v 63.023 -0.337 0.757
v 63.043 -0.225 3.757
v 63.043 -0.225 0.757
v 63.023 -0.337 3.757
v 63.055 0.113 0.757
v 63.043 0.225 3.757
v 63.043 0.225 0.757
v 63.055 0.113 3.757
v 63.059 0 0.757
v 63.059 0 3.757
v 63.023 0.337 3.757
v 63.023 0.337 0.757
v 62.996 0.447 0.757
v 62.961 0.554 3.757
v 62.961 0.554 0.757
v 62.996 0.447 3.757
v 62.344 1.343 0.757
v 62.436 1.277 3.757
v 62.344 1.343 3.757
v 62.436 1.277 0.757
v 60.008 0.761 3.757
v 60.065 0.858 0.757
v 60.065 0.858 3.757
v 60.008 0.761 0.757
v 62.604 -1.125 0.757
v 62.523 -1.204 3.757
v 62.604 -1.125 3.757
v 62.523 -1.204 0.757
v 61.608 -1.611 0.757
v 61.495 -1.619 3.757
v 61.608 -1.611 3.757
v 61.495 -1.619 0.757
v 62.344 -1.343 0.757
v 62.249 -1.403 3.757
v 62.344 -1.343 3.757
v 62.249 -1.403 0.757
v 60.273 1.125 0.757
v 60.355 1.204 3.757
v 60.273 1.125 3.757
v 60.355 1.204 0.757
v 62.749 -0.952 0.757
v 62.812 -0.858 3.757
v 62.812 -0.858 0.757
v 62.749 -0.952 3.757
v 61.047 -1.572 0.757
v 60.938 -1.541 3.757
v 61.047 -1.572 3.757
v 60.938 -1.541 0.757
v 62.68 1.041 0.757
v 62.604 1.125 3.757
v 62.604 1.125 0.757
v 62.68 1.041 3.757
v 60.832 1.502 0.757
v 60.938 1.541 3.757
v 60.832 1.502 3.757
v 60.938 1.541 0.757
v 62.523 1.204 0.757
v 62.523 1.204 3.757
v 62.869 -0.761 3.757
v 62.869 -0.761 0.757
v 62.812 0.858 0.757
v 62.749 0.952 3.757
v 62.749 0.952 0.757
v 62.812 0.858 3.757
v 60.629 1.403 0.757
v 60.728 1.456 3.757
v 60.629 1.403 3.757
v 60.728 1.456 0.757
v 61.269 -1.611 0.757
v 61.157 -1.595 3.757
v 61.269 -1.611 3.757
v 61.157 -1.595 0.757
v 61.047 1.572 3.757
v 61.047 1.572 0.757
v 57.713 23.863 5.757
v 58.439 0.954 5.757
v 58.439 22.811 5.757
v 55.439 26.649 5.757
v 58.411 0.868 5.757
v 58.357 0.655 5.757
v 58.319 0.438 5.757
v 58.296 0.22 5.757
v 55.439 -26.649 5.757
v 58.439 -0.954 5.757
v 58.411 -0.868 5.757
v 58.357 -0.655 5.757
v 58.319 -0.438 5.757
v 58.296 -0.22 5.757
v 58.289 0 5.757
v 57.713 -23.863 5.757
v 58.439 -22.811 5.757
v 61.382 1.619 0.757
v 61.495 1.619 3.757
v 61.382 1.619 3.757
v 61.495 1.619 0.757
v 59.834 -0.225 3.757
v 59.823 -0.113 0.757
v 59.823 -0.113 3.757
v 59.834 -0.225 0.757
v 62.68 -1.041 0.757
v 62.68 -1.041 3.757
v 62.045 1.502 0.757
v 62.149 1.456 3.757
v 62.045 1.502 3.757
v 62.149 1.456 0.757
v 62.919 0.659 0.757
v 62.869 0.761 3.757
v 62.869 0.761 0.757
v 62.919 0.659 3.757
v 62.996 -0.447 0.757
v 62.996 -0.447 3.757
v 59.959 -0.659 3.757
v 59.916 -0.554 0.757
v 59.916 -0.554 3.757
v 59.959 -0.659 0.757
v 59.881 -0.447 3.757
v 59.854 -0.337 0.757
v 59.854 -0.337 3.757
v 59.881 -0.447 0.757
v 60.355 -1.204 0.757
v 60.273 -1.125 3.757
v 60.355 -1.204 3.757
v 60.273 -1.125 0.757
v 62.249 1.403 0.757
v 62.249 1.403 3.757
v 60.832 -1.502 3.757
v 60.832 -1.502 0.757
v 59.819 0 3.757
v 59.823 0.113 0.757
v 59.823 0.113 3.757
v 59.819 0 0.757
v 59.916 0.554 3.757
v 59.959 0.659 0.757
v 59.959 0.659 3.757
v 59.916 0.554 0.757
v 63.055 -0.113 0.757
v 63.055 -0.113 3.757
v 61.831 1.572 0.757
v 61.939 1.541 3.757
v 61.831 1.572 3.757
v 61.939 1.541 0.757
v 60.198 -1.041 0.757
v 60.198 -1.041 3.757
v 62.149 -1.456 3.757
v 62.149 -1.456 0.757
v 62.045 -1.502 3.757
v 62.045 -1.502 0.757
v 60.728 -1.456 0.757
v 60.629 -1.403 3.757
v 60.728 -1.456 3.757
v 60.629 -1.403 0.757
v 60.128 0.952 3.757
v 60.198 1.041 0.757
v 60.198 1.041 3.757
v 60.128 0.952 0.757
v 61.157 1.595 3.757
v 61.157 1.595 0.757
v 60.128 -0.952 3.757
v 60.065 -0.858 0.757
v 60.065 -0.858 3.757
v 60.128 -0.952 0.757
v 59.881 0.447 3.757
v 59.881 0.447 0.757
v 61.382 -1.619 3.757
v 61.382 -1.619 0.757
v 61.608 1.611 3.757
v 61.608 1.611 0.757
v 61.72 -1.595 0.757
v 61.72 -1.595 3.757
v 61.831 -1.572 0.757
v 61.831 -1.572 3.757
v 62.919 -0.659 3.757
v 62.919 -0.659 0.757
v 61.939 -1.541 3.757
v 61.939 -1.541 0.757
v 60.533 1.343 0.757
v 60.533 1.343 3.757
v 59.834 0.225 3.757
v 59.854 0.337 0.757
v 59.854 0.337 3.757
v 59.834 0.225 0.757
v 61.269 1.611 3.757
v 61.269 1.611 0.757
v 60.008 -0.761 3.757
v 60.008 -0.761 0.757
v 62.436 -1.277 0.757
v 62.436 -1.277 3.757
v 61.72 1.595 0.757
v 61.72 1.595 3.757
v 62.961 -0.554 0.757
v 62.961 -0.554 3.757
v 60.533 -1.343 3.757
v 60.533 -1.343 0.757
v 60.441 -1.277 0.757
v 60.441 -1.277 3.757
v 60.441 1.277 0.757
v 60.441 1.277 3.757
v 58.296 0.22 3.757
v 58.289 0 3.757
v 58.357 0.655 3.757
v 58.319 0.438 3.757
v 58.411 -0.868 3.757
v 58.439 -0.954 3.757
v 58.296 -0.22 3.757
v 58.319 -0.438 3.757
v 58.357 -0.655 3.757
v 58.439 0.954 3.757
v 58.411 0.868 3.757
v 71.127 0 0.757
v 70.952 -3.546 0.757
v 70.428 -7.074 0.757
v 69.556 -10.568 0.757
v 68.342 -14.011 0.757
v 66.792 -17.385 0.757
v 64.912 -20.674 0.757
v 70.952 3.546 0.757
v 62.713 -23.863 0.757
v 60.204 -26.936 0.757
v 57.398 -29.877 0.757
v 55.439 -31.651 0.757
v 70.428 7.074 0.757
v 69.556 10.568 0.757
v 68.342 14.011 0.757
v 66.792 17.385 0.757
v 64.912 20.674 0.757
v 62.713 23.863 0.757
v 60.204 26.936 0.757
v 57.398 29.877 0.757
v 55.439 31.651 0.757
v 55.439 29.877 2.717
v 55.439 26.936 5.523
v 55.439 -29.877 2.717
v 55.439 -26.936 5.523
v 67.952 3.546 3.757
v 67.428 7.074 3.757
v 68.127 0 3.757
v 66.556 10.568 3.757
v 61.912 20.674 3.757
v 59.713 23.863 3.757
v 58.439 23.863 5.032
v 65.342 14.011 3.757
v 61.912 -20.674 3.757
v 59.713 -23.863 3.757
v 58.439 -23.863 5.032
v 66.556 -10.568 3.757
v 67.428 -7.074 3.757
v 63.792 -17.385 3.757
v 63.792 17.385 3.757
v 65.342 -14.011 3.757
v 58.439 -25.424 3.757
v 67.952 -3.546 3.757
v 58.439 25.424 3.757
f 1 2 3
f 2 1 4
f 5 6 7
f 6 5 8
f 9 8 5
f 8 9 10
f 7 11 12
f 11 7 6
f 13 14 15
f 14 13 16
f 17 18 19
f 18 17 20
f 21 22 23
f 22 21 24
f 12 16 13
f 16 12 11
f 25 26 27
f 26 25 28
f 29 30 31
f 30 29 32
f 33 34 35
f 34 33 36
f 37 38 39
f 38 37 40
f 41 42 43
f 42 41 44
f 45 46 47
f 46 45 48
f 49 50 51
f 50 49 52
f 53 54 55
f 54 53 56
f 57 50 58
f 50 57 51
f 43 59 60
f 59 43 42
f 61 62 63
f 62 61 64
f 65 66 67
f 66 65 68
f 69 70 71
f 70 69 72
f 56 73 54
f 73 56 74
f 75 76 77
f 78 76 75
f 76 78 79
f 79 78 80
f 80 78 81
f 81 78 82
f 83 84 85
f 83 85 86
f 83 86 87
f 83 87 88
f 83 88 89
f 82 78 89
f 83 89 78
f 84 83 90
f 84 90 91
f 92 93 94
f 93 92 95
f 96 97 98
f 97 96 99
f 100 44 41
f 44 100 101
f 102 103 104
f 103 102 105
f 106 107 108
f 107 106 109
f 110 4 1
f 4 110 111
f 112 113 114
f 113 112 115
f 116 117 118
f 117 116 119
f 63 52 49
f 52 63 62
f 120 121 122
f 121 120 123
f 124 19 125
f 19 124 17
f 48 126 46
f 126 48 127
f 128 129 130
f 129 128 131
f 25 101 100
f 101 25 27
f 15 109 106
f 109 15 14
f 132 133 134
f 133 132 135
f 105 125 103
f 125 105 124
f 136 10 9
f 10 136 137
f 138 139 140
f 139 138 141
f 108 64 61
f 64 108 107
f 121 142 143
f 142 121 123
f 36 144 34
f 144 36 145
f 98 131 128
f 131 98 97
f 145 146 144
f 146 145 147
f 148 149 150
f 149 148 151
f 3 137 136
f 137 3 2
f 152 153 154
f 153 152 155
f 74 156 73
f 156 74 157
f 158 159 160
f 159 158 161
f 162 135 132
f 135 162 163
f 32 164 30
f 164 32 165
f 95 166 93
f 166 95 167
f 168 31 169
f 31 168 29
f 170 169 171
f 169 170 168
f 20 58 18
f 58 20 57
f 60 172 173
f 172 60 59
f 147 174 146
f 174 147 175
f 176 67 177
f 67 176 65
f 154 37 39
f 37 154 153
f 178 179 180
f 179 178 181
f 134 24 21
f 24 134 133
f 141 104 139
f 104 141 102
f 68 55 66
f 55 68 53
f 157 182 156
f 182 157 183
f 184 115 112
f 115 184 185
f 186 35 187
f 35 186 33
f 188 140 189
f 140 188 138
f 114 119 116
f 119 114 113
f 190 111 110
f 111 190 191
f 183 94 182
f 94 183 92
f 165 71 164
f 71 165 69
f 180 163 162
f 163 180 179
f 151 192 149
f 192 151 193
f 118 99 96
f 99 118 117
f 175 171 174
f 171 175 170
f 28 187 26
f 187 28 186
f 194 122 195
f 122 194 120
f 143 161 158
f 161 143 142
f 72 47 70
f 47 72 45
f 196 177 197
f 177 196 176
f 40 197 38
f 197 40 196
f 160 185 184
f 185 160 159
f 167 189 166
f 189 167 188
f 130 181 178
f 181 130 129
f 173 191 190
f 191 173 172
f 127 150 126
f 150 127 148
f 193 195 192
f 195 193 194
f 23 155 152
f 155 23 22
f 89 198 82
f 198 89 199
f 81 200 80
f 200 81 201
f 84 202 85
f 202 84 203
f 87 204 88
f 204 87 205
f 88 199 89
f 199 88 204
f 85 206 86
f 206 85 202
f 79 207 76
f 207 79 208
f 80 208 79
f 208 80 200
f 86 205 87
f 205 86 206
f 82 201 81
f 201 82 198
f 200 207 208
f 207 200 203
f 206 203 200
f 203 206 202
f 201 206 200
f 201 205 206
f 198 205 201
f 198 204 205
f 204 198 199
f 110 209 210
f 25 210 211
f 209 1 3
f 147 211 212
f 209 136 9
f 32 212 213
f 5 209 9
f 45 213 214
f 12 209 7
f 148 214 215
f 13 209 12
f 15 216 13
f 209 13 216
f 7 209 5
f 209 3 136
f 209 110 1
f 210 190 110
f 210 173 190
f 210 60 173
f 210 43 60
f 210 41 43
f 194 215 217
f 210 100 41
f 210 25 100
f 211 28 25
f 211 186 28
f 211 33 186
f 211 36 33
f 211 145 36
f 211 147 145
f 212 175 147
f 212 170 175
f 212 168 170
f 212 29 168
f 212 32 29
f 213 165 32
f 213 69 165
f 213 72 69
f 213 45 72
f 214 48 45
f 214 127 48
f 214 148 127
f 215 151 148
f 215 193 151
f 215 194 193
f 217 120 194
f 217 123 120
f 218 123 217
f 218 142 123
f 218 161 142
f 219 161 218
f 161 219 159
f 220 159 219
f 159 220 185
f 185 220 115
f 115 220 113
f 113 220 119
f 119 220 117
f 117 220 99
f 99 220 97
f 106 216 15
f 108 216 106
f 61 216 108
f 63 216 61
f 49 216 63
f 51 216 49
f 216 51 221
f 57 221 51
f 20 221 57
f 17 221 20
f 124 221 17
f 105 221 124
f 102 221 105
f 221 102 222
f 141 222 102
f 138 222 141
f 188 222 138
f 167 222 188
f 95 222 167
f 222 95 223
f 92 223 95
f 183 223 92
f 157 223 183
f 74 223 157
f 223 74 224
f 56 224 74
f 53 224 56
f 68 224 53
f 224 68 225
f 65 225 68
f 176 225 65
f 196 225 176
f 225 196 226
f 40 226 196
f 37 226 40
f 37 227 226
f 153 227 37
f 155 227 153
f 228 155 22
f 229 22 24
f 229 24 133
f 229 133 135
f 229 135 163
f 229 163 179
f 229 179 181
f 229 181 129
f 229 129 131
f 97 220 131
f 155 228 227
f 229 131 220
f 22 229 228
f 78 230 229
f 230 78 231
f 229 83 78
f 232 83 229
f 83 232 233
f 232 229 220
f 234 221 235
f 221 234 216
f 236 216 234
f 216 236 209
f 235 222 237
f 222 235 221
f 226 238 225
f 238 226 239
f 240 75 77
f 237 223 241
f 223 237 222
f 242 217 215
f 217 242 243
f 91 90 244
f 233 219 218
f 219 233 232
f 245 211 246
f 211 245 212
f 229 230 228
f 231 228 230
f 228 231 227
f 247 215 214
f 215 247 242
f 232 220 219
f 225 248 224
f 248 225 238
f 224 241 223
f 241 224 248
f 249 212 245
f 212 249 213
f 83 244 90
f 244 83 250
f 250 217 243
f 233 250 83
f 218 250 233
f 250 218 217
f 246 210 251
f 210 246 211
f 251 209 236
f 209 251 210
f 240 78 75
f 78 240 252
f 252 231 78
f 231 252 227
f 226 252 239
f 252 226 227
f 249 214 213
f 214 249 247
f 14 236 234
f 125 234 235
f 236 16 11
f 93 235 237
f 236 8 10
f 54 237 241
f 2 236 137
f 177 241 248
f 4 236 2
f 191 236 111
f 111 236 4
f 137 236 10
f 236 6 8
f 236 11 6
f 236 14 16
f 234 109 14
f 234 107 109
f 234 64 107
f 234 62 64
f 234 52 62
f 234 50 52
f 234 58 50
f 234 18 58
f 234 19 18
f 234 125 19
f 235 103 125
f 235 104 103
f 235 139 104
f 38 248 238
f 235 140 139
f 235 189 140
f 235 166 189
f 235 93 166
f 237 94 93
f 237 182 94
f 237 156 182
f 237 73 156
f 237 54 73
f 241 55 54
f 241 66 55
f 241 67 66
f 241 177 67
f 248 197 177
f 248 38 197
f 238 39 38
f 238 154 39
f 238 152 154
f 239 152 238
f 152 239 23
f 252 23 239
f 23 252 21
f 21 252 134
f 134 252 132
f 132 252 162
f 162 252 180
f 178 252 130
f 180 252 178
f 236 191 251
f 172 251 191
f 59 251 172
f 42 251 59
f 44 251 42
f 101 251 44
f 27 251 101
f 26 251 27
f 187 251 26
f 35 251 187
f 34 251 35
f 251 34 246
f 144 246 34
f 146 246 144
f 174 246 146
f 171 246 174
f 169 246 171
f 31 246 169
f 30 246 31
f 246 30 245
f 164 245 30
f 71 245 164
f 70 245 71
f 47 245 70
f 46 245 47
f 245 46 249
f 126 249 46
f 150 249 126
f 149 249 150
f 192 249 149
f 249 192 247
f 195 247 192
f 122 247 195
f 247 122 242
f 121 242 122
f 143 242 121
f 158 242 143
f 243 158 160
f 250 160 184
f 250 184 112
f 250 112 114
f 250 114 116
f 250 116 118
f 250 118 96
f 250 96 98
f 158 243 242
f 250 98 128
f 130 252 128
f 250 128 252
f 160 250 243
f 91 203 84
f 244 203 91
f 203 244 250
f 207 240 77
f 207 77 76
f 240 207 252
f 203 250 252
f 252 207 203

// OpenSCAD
// file: parts.scad
include <definitions.scad>
elevation =  BASE_MIN_THICKNESS + PIPE_DIAMETER_INNER/2 + PIPE_MARGIN - WALL_THICKNESS;

module diagonal_end_rest_raw(flat=false, with_hole=false) {
    translate([0, 0, elevation])
    rotate([0, 45, 0]) {
        // bottom-most wall, shorter to create rest
        translate([0, 0, -REST_HEIGHT/2])
        difference() {
            // wall, full surface, creating rest top
            thickness = flat? REST_HEIGHT /2 : REST_LENGTH;
            dz = REST_HEIGHT + thickness/2;
            translate([-dz, 0, dz])
            cube([PIPE_DIAMETER_INNER* S2 *2, PIPE_DIAMETER_INNER, thickness], true);

            // remove extraneous rest top
            translate([-REST_LENGTH-WALL_THICKNESS, 0, REST_HEIGHT])
            cube([PIPE_DIAMETER_INNER* S2 + REST_HEIGHT*S2, PIPE_DIAMETER_INNER+ATOM*2, REST_HEIGHT+REST_LENGTH*2], true);
            
            if (with_hole)
                translate([0, 0, SCREW_HEAD_THICKNESS + WALL_THICKNESS])
                make_screw(true);
        }
    }
}

module diagonal_end_rest(flat=false, with_hole=false) {
    thickness = REST_LENGTH;
    dz = REST_HEIGHT + thickness/2 +REST_HEIGHT/2;
    dz = WALL_THICKNESS*2;
    rotate([0, flat?-45:0, 0])
    translate([0, 0, flat?-elevation-dz:0])
    intersection() {
        radius = PIPE_DIAMETER_INNER/2;
        diagonal_end_rest_raw(flat, with_hole);
        if (flat)
            barrel(radius-TOLERANCE, 0, PIPE_HEIGHT);
    }
}

module diagonal_end_holes(is_wall) {
    translate([0, 0, elevation])
    rotate([0, 45, 0]) {
        d = is_wall ? LOGO_TENONS_DIAMETER + WALL_THINNER_THICKNESS * 2 : LOGO_TENONS_DIAMETER;
        z =  -REST_HEIGHT/2  +  (is_wall ? WALL_THINNER_THICKNESS : -ATOM);
        translate([LOGO_TENONS_X_SHIFT, +LOGO_TENONS_DISTANCE/2, z])
        cylinder(d=d, h=LOGO_TENONS_DEPTH);
        translate([LOGO_TENONS_X_SHIFT, -LOGO_TENONS_DISTANCE/2, z])
        cylinder(d=d, h=LOGO_TENONS_DEPTH);
    }
}

module make_screw(is_clearance) {
    pos = (PIPE_DIAMETER_INNER* S2 + REST_HEIGHT*S2)/2 - REST_LENGTH + WALL_THICKNESS;
    translate([pos, 0, REST_HEIGHT/2 + WALL_THICKNESS])
    screw(is_clearance_hole=is_clearance);
}

module diagonal_end_raw() {
    translate([0, 0, elevation])
    rotate([0, 45, 0]) {
        difference() {
            union() {
                //
                // bottom-most wall, shorter to create rest
                //
                difference() {
                    union() {
                        translate([-REST_LENGTH, 0, 0])
                        cube([PIPE_DIAMETER_INNER* S2 + REST_HEIGHT*S2, PIPE_DIAMETER_INNER, REST_HEIGHT], true);
                        // cable grove
                        cube([PIPE_DIAMETER_INNER* S2 + REST_HEIGHT*S2, PLUG_GROVE_WIDTH, REST_HEIGHT], true);   
                    }
                    // make wall thinner
                    translate([-REST_LENGTH-WALL_THICKNESS, 0, WALL_THICKNESS*1.5])
                    cube([PIPE_DIAMETER_INNER* S2 + REST_HEIGHT*S2, PIPE_DIAMETER_INNER, REST_HEIGHT+WALL_THICKNESS], true);
                }

                // long diameter foot
                h = PIPE_DIAMETER_INNER;
                hf1 = 1;
                translate([0, 0, h/2*hf1 - REST_HEIGHT/2])
                cube([PIPE_DIAMETER_INNER* S2*S2, WALL_THIN_THICKNESS, h*hf1], true);

                // short diameter foot
                hf2 = 1/4;
                translate([0, 0, PIPE_DIAMETER_INNER/2*hf2 - REST_HEIGHT/2])
                cube([WALL_THIN_THICKNESS, PIPE_DIAMETER_INNER, PIPE_DIAMETER_INNER*hf2], true);
            }
            // screw hole
            make_screw(false);
        }
    }

    diagonal_end_holes(true);
}

module diagonal_end(flat=false) {
    sink = flat ? -elevation + REST_HEIGHT / S2 : 0;
    rot = flat ? -45 : 0;
    
    rotate([0, rot, 0])
    translate([0, 0, sink])
    difference() {
        intersection() {
            diagonal_end_raw();
            barrel(PIPE_DIAMETER_INNER/2, 0, PIPE_HEIGHT);
        }
        // remove rest
        diagonal_end_rest();
        diagonal_end_holes(false);
    }
}

module perpendicular_end_raw(recess) {
    // small chamber
    translate([0, 0, CABLE_GROVE_HEIGHT/2 + PIPE_MARGIN/2])
    trapezoid([PIPE_DIAMETER_OUTER, CABLE_GROVE_WIDTH-recess*2, CABLE_GROVE_HEIGHT + PIPE_MARGIN], true, 10, true);

    // big chamber
    translate([-CAVITY_SHORTAGE/2, 0, CAVITY_HEIGHT/2 + PIPE_MARGIN/2]) {
        intersection() {
            trapezoid([PIPE_DIAMETER_INNER-CAVITY_SHORTAGE, CAVITY_WIDTH-recess*2, CAVITY_HEIGHT + PIPE_MARGIN], true, 10, true);
        
            translate([-PIPE_DIAMETER_INNER/8 + CAVITY_SPHERE_SHIFT_TUNING, 0, -PIPE_DIAMETER_INNER/4])
            sphere(d=PIPE_DIAMETER_INNER + CAVITY_SPHERE_RADIUS_TUNING);
        }
    }

    if (!recess) {
        // small chamber mark
        translate([0, 0, PIPE_MARGIN/2])
        trapezoid([PIPE_DIAMETER_OUTER, CABLE_GROVE_WIDTH+MARK_THICKNESS*2-recess*2, PIPE_MARGIN], true);

        // big chamber mark
        translate([-CAVITY_SHORTAGE/2, 0, PIPE_MARGIN/2])
        trapezoid([PIPE_DIAMETER_INNER-CAVITY_SHORTAGE, CAVITY_WIDTH+MARK_THICKNESS*2-recess*2, PIPE_MARGIN], true);
        
        // strut
        strut_height = WALL_THICKNESS;
        translate([0, 0, strut_height/2])
        cube([WALL_THICKNESS, PIPE_DIAMETER_INNER, strut_height], true); 
    }
}

module perpendicular_end_stop() {
    difference() {
        union() {
            // small chamber base
            translate([0, 0, -STOP_THICKNESS/2])
            cube([PIPE_DIAMETER_OUTER, CABLE_GROVE_WIDTH + MARK_THICKNESS*2, STOP_THICKNESS], true);

            // big chamber base
            translate([-CAVITY_SHORTAGE/2 -PIPE_THICKNESS/2, 0, -STOP_THICKNESS/2])
            cube([PIPE_DIAMETER_OUTER-PIPE_THICKNESS-CAVITY_SHORTAGE, CAVITY_WIDTH+MARK_THICKNESS*2, STOP_THICKNESS], true);
            
            // strut
            translate([0, 0, -STOP_THICKNESS/2])
            cube([WALL_THICKNESS, PIPE_DIAMETER_OUTER, STOP_THICKNESS], true); 
        }
        // groove
        translate([0, 0, -STOP_THICKNESS/2])
        cube([PIPE_DIAMETER_OUTER+ATOM, BASE_GROOVE_WIDTH, STOP_THICKNESS+ATOM], true);
    }

    // groove filler
    translate([WALL_THICKNESS+5, PIPE_DIAMETER_OUTER/2 +CAVITY_WIDTH/2 + 5 , -STOP_THICKNESS/2])
    //%translate([0, 0 , -STOP_THICKNESS/2 -STOP_THICKNESS ])
    {
        // grove filler
        translate([0, 0, STOP_THICKNESS])
        cube([PIPE_DIAMETER_OUTER+ATOM, BASE_GROOVE_WIDTH - TOLERANCE*1.5, STOP_THICKNESS+ATOM], true);

        // support (cross)
        cube([PIPE_DIAMETER_OUTER+ATOM, CABLE_GROVE_WIDTH + MARK_THICKNESS*2, STOP_THICKNESS+ATOM], true);
        cube([WALL_THICKNESS, PIPE_DIAMETER_OUTER * .8, STOP_THICKNESS], true); 
    }
}

module perpendicular_end(flat=false) {
    translate([0, 0, flat ? STOP_THICKNESS : 0])
    {
        intersection() {
            difference() {
                perpendicular_end_raw(0);
                translate([-WALL_THINNER_THICKNESS, 0, -WALL_THINNER_THICKNESS])
                perpendicular_end_raw(WALL_THINNER_THICKNESS);
            }
            barrel(PIPE_DIAMETER_INNER/2, 0, PIPE_HEIGHT);
        }
        perpendicular_end_stop();
    }
}

perpendicular_end();
diagonal_end();
%barrel(PIPE_DIAMETER_OUTER/2, PIPE_DIAMETER_INNER/2, PIPE_HEIGHT);

translate([150, 0, 0])
diagonal_end(flat=true);
// file: definitions.scad
S2 = sqrt(2);
ATOM = 0.001;
TOLERANCE = 0.17;
PLAY = 0.4;

PIPE_THICKNESS = 2.5;
PIPE_DIAMETER_INNER = 102;
PIPE_DIAMETER_OUTER = PIPE_DIAMETER_INNER + 2 * PIPE_THICKNESS;
PIPE_MARGIN = 10;
PIPE_HEIGHT = 135 - 4.5; // please manually adjust

WALL_THICKNESS = 3;
WALL_THIN_THICKNESS = 2;
WALL_THINNER_THICKNESS = 1;
REST_HEIGHT = 10;
REST_LENGTH = 25;
BASE_MIN_THICKNESS = 25;
PLUG_GROVE_WIDTH = 12;

CABLE_GROVE_WIDTH = 7;
CABLE_GROVE_HEIGHT = 5;

BASE_GROOVE_WIDTH = 3.5;

CAVITY_WIDTH = 20;
CAVITY_SHORTAGE = 35;
CAVITY_HEIGHT = 30;
CAVITY_SPHERE_RADIUS_TUNING = 3;
CAVITY_SPHERE_SHIFT_TUNING = -3;

MARK_THICKNESS = 0.5;
STOP_THICKNESS = 2;

SUPPORT_THICKNESS = 0.5;

LOGO_TENONS_DISTANCE = 30;
LOGO_TENONS_DIAMETER = 5;
LOGO_TENONS_DEPTH = 10;
LOGO_TENONS_X_SHIFT = 5;

SCREW_DIAMETER = 2.9;
SCREW_HEAD_DIAMETER = 5.5;
SCREW_HEAD_THICKNESS = 2;
SCREW_HEIGHT = 12; // overall


$fn = 90;

module barrel(outer_radius, inner_radius, height) {
    scale([1, 1, height])
    difference() {
        cylinder(r=outer_radius);
        if (inner_radius)
            translate([0, 0, -0.5]) scale([1, 1, 2])
            cylinder(r=inner_radius);
    }
}

module trapezoid(size, center, conicity=20, rounded=false) {
//    cube(size, center);
    x = size[0];
    y = size[1];
    z = size[2];
    d = z / conicity; // conicity
    
    points = [
    [ 0,  0,  0 ],  //0
    [ x,  0,  0 ],  //1
    [ x,  y,  0 ],  //2
    [ 0,  y,  0 ],  //3
    [ 0,  d,  z ],  //4
    [ x,  d,  z ],  //5
    [ x,  y-d,  z ],  //6
    [ 0,  y-d,  z ]]; //7

    faces = [
    [0,1,2,3],  // bottom
    [4,5,1,0],  // front
    [7,6,5,4],  // top
    [5,6,2,1],  // right
    [6,7,3,2],  // back
    [7,4,0,3]]; // left

    translate([center ? -x/2 : 0, center ? -y/2 : 0, center ? -z/2 : 0]) {
        polyhedron(points, faces);

        if (rounded)
            translate([x/2, y/2, z])
            scale([1, 1, 0.5])
            rotate([0, 90, 0])
            cylinder(h=x, r=y/2-d, center=true);
    }
}

module screw(head_extent=0, is_clearance_hole=false) {   
    // thread
    translate([0, 0, -SCREW_HEIGHT + SCREW_HEAD_THICKNESS])
    cylinder(h=SCREW_HEIGHT,
             r=SCREW_DIAMETER/2 - TOLERANCE
               + (is_clearance_hole ? TOLERANCE*2 : 0));
    // head
    for (i=[0:head_extent])
        translate([0, 0, i])
        cylinder(h=SCREW_HEAD_THICKNESS, 
                 r=SCREW_HEAD_DIAMETER/2 + (is_clearance_hole ? PLAY : 0));
}
// main file
// Density: 20%
// Quality: Normal

include <definitions.scad>
use <parts.scad>

difference() {
    diagonal_end_rest(flat=true, with_hole=true);

    translate([WALL_THICKNESS, 0, WALL_THICKNESS])
    diagonal_end_rest(flat=true, with_hole=false);
}
